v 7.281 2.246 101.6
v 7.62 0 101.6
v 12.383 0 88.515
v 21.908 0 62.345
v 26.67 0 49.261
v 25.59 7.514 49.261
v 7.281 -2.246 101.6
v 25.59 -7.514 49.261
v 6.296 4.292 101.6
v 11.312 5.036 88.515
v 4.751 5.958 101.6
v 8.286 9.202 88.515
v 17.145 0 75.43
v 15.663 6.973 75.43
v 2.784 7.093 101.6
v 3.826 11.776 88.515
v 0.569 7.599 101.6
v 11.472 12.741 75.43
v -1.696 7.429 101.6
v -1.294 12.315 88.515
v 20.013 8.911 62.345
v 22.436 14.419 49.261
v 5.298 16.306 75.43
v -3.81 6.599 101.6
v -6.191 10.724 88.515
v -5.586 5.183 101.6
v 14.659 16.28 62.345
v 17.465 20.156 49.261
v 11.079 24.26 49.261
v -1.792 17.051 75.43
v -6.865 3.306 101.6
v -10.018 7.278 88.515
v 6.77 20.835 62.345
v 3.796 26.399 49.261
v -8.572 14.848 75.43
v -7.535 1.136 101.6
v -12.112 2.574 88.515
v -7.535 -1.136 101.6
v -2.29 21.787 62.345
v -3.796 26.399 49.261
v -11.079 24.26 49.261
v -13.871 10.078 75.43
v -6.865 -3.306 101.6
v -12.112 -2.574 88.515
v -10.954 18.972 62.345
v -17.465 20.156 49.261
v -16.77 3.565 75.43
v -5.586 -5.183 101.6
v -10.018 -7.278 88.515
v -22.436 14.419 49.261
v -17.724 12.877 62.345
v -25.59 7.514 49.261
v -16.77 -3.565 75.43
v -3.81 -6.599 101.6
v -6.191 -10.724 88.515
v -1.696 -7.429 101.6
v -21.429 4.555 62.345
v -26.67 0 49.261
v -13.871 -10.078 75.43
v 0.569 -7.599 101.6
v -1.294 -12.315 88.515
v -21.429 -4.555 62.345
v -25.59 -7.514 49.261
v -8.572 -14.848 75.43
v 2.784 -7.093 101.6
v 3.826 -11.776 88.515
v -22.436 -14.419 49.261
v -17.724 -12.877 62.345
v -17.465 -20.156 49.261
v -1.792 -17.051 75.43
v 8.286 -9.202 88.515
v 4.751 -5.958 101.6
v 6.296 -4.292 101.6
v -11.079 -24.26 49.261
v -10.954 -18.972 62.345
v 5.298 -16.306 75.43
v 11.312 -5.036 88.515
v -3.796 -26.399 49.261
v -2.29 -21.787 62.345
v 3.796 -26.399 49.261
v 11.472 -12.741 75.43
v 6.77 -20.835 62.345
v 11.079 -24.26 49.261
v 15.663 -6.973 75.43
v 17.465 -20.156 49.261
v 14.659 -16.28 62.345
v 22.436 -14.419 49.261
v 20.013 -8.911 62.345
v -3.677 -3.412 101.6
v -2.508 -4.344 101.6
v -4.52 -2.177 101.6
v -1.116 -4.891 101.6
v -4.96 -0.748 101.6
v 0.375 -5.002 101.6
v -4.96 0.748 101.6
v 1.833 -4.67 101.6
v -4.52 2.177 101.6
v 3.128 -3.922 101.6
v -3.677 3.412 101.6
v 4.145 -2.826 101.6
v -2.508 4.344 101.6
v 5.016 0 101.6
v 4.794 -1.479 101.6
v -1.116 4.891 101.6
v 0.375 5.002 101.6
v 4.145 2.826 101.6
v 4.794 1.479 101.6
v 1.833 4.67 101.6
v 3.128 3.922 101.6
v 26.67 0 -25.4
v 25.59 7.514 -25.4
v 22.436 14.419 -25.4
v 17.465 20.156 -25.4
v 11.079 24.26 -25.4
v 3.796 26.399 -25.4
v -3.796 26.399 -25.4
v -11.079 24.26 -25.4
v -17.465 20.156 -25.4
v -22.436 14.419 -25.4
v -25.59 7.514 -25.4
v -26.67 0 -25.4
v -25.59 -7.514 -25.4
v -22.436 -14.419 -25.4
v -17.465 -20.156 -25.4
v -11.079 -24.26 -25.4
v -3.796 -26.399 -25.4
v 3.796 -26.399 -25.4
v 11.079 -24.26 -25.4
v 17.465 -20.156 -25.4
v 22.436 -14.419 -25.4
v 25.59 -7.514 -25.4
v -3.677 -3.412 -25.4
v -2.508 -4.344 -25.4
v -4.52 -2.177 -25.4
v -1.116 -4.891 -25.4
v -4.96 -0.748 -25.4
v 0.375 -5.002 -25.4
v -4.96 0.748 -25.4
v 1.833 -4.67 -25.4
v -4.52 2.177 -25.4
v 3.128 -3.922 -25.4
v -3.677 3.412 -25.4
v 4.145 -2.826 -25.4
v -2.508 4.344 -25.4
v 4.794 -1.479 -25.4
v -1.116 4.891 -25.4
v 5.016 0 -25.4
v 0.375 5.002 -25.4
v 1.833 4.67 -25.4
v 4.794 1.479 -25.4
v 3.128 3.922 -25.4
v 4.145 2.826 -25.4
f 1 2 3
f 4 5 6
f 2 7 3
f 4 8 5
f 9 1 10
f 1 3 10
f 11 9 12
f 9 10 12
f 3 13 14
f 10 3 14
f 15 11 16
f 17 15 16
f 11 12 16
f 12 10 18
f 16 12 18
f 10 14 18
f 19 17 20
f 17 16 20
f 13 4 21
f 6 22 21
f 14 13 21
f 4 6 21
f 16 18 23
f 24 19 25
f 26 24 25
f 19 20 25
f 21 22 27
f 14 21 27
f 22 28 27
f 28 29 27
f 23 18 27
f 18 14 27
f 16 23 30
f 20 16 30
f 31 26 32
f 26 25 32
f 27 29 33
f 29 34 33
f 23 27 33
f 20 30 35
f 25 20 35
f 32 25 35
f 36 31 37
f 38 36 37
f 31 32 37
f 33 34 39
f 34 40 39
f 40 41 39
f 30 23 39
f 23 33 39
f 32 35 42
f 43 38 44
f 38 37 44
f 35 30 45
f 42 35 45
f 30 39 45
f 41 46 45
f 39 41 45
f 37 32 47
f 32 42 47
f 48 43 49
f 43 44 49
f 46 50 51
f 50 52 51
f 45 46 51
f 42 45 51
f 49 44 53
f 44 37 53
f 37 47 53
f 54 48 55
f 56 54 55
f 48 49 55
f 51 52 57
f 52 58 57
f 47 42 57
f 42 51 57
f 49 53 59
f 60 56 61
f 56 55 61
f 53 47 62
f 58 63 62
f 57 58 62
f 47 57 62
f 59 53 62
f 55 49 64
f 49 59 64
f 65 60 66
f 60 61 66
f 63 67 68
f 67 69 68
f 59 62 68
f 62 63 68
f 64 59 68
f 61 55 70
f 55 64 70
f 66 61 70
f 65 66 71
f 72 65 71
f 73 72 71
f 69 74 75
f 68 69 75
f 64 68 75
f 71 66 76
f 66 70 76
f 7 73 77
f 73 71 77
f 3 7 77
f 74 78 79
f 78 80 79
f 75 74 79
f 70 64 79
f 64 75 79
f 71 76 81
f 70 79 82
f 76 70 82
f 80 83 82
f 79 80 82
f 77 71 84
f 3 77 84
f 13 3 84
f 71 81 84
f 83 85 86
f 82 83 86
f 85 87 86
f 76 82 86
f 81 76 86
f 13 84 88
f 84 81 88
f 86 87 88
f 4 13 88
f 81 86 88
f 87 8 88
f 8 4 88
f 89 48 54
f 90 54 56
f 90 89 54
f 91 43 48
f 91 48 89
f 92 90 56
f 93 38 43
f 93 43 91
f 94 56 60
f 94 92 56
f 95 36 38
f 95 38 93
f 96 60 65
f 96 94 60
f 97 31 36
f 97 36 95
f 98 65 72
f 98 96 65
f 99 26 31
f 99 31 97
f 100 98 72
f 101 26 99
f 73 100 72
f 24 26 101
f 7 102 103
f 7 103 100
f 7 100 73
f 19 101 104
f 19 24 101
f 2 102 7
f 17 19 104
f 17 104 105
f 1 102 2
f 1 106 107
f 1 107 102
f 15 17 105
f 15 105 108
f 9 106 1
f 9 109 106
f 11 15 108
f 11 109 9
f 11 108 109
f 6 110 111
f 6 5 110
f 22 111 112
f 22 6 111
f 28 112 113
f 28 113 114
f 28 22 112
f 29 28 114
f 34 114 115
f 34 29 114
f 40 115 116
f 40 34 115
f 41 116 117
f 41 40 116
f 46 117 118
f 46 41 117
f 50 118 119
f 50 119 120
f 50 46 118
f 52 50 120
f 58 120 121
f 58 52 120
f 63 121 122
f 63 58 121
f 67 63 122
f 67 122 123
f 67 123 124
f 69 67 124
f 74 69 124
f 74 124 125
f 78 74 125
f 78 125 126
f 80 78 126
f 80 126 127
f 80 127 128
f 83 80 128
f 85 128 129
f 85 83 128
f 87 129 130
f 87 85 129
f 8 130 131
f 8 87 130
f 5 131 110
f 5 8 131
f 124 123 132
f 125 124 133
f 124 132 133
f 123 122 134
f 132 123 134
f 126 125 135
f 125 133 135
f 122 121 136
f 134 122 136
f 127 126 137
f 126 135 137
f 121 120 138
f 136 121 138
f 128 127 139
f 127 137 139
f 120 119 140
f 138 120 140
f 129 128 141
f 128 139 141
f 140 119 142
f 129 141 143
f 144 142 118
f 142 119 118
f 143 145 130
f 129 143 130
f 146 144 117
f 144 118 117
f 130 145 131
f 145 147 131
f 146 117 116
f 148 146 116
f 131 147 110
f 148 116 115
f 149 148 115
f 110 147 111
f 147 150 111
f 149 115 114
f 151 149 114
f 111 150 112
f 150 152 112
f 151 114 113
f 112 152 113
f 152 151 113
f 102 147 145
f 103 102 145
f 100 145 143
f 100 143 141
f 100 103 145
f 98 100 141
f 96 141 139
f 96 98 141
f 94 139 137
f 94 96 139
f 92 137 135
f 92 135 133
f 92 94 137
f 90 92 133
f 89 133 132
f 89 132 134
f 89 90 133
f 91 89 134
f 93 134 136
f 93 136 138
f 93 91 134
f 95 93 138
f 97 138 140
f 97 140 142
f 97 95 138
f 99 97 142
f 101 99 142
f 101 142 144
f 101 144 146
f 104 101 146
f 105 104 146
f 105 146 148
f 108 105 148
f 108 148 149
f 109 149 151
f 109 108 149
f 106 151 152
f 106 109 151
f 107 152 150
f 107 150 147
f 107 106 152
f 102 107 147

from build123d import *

# Parameters (mm, degrees)
F0_R     = 26.67
F1_DEPTH = 101.6
F2_SIZE2 = 52.3394448406
F2_SIZE  = 19.05
F3_R     = 5.0165
F4_DEPTH = 101.6
F5_DEPTH = 25.4


with BuildPart() as f1:
    # F0 (on Top) → F1 (new body)
    with BuildSketch(Plane.XY):
        Circle(F0_R)
    extrude(amount=F1_DEPTH)

    # F2
    f2_edges = [f1.edges().sort_by_distance(p)[0] for p in [
        (-26.67, 0, 101.6),
    ]]
    f2_side = f1.faces().sort_by_distance((0, 0, 101.6))[0]
    chamfer(f2_edges, length=F2_SIZE, length2=F2_SIZE2, reference=f2_side)

    # F3 (on face) → F4 (cut)
    with BuildSketch(Plane(origin=(0, 0, 0), x_dir=(1, 0, 0), z_dir=(0, 0, -1))):
        Circle(F3_R)
    extrude(amount=-F4_DEPTH, mode=Mode.SUBTRACT)

    # F5 (add): a face of the model
    f5_faces = [f1.faces().sort_by_distance(p)[0] for p in [
        (-25.9156584858, 0, 0),
    ]]
    extrude(f5_faces, amount=F5_DEPTH)


solid = f1.part
